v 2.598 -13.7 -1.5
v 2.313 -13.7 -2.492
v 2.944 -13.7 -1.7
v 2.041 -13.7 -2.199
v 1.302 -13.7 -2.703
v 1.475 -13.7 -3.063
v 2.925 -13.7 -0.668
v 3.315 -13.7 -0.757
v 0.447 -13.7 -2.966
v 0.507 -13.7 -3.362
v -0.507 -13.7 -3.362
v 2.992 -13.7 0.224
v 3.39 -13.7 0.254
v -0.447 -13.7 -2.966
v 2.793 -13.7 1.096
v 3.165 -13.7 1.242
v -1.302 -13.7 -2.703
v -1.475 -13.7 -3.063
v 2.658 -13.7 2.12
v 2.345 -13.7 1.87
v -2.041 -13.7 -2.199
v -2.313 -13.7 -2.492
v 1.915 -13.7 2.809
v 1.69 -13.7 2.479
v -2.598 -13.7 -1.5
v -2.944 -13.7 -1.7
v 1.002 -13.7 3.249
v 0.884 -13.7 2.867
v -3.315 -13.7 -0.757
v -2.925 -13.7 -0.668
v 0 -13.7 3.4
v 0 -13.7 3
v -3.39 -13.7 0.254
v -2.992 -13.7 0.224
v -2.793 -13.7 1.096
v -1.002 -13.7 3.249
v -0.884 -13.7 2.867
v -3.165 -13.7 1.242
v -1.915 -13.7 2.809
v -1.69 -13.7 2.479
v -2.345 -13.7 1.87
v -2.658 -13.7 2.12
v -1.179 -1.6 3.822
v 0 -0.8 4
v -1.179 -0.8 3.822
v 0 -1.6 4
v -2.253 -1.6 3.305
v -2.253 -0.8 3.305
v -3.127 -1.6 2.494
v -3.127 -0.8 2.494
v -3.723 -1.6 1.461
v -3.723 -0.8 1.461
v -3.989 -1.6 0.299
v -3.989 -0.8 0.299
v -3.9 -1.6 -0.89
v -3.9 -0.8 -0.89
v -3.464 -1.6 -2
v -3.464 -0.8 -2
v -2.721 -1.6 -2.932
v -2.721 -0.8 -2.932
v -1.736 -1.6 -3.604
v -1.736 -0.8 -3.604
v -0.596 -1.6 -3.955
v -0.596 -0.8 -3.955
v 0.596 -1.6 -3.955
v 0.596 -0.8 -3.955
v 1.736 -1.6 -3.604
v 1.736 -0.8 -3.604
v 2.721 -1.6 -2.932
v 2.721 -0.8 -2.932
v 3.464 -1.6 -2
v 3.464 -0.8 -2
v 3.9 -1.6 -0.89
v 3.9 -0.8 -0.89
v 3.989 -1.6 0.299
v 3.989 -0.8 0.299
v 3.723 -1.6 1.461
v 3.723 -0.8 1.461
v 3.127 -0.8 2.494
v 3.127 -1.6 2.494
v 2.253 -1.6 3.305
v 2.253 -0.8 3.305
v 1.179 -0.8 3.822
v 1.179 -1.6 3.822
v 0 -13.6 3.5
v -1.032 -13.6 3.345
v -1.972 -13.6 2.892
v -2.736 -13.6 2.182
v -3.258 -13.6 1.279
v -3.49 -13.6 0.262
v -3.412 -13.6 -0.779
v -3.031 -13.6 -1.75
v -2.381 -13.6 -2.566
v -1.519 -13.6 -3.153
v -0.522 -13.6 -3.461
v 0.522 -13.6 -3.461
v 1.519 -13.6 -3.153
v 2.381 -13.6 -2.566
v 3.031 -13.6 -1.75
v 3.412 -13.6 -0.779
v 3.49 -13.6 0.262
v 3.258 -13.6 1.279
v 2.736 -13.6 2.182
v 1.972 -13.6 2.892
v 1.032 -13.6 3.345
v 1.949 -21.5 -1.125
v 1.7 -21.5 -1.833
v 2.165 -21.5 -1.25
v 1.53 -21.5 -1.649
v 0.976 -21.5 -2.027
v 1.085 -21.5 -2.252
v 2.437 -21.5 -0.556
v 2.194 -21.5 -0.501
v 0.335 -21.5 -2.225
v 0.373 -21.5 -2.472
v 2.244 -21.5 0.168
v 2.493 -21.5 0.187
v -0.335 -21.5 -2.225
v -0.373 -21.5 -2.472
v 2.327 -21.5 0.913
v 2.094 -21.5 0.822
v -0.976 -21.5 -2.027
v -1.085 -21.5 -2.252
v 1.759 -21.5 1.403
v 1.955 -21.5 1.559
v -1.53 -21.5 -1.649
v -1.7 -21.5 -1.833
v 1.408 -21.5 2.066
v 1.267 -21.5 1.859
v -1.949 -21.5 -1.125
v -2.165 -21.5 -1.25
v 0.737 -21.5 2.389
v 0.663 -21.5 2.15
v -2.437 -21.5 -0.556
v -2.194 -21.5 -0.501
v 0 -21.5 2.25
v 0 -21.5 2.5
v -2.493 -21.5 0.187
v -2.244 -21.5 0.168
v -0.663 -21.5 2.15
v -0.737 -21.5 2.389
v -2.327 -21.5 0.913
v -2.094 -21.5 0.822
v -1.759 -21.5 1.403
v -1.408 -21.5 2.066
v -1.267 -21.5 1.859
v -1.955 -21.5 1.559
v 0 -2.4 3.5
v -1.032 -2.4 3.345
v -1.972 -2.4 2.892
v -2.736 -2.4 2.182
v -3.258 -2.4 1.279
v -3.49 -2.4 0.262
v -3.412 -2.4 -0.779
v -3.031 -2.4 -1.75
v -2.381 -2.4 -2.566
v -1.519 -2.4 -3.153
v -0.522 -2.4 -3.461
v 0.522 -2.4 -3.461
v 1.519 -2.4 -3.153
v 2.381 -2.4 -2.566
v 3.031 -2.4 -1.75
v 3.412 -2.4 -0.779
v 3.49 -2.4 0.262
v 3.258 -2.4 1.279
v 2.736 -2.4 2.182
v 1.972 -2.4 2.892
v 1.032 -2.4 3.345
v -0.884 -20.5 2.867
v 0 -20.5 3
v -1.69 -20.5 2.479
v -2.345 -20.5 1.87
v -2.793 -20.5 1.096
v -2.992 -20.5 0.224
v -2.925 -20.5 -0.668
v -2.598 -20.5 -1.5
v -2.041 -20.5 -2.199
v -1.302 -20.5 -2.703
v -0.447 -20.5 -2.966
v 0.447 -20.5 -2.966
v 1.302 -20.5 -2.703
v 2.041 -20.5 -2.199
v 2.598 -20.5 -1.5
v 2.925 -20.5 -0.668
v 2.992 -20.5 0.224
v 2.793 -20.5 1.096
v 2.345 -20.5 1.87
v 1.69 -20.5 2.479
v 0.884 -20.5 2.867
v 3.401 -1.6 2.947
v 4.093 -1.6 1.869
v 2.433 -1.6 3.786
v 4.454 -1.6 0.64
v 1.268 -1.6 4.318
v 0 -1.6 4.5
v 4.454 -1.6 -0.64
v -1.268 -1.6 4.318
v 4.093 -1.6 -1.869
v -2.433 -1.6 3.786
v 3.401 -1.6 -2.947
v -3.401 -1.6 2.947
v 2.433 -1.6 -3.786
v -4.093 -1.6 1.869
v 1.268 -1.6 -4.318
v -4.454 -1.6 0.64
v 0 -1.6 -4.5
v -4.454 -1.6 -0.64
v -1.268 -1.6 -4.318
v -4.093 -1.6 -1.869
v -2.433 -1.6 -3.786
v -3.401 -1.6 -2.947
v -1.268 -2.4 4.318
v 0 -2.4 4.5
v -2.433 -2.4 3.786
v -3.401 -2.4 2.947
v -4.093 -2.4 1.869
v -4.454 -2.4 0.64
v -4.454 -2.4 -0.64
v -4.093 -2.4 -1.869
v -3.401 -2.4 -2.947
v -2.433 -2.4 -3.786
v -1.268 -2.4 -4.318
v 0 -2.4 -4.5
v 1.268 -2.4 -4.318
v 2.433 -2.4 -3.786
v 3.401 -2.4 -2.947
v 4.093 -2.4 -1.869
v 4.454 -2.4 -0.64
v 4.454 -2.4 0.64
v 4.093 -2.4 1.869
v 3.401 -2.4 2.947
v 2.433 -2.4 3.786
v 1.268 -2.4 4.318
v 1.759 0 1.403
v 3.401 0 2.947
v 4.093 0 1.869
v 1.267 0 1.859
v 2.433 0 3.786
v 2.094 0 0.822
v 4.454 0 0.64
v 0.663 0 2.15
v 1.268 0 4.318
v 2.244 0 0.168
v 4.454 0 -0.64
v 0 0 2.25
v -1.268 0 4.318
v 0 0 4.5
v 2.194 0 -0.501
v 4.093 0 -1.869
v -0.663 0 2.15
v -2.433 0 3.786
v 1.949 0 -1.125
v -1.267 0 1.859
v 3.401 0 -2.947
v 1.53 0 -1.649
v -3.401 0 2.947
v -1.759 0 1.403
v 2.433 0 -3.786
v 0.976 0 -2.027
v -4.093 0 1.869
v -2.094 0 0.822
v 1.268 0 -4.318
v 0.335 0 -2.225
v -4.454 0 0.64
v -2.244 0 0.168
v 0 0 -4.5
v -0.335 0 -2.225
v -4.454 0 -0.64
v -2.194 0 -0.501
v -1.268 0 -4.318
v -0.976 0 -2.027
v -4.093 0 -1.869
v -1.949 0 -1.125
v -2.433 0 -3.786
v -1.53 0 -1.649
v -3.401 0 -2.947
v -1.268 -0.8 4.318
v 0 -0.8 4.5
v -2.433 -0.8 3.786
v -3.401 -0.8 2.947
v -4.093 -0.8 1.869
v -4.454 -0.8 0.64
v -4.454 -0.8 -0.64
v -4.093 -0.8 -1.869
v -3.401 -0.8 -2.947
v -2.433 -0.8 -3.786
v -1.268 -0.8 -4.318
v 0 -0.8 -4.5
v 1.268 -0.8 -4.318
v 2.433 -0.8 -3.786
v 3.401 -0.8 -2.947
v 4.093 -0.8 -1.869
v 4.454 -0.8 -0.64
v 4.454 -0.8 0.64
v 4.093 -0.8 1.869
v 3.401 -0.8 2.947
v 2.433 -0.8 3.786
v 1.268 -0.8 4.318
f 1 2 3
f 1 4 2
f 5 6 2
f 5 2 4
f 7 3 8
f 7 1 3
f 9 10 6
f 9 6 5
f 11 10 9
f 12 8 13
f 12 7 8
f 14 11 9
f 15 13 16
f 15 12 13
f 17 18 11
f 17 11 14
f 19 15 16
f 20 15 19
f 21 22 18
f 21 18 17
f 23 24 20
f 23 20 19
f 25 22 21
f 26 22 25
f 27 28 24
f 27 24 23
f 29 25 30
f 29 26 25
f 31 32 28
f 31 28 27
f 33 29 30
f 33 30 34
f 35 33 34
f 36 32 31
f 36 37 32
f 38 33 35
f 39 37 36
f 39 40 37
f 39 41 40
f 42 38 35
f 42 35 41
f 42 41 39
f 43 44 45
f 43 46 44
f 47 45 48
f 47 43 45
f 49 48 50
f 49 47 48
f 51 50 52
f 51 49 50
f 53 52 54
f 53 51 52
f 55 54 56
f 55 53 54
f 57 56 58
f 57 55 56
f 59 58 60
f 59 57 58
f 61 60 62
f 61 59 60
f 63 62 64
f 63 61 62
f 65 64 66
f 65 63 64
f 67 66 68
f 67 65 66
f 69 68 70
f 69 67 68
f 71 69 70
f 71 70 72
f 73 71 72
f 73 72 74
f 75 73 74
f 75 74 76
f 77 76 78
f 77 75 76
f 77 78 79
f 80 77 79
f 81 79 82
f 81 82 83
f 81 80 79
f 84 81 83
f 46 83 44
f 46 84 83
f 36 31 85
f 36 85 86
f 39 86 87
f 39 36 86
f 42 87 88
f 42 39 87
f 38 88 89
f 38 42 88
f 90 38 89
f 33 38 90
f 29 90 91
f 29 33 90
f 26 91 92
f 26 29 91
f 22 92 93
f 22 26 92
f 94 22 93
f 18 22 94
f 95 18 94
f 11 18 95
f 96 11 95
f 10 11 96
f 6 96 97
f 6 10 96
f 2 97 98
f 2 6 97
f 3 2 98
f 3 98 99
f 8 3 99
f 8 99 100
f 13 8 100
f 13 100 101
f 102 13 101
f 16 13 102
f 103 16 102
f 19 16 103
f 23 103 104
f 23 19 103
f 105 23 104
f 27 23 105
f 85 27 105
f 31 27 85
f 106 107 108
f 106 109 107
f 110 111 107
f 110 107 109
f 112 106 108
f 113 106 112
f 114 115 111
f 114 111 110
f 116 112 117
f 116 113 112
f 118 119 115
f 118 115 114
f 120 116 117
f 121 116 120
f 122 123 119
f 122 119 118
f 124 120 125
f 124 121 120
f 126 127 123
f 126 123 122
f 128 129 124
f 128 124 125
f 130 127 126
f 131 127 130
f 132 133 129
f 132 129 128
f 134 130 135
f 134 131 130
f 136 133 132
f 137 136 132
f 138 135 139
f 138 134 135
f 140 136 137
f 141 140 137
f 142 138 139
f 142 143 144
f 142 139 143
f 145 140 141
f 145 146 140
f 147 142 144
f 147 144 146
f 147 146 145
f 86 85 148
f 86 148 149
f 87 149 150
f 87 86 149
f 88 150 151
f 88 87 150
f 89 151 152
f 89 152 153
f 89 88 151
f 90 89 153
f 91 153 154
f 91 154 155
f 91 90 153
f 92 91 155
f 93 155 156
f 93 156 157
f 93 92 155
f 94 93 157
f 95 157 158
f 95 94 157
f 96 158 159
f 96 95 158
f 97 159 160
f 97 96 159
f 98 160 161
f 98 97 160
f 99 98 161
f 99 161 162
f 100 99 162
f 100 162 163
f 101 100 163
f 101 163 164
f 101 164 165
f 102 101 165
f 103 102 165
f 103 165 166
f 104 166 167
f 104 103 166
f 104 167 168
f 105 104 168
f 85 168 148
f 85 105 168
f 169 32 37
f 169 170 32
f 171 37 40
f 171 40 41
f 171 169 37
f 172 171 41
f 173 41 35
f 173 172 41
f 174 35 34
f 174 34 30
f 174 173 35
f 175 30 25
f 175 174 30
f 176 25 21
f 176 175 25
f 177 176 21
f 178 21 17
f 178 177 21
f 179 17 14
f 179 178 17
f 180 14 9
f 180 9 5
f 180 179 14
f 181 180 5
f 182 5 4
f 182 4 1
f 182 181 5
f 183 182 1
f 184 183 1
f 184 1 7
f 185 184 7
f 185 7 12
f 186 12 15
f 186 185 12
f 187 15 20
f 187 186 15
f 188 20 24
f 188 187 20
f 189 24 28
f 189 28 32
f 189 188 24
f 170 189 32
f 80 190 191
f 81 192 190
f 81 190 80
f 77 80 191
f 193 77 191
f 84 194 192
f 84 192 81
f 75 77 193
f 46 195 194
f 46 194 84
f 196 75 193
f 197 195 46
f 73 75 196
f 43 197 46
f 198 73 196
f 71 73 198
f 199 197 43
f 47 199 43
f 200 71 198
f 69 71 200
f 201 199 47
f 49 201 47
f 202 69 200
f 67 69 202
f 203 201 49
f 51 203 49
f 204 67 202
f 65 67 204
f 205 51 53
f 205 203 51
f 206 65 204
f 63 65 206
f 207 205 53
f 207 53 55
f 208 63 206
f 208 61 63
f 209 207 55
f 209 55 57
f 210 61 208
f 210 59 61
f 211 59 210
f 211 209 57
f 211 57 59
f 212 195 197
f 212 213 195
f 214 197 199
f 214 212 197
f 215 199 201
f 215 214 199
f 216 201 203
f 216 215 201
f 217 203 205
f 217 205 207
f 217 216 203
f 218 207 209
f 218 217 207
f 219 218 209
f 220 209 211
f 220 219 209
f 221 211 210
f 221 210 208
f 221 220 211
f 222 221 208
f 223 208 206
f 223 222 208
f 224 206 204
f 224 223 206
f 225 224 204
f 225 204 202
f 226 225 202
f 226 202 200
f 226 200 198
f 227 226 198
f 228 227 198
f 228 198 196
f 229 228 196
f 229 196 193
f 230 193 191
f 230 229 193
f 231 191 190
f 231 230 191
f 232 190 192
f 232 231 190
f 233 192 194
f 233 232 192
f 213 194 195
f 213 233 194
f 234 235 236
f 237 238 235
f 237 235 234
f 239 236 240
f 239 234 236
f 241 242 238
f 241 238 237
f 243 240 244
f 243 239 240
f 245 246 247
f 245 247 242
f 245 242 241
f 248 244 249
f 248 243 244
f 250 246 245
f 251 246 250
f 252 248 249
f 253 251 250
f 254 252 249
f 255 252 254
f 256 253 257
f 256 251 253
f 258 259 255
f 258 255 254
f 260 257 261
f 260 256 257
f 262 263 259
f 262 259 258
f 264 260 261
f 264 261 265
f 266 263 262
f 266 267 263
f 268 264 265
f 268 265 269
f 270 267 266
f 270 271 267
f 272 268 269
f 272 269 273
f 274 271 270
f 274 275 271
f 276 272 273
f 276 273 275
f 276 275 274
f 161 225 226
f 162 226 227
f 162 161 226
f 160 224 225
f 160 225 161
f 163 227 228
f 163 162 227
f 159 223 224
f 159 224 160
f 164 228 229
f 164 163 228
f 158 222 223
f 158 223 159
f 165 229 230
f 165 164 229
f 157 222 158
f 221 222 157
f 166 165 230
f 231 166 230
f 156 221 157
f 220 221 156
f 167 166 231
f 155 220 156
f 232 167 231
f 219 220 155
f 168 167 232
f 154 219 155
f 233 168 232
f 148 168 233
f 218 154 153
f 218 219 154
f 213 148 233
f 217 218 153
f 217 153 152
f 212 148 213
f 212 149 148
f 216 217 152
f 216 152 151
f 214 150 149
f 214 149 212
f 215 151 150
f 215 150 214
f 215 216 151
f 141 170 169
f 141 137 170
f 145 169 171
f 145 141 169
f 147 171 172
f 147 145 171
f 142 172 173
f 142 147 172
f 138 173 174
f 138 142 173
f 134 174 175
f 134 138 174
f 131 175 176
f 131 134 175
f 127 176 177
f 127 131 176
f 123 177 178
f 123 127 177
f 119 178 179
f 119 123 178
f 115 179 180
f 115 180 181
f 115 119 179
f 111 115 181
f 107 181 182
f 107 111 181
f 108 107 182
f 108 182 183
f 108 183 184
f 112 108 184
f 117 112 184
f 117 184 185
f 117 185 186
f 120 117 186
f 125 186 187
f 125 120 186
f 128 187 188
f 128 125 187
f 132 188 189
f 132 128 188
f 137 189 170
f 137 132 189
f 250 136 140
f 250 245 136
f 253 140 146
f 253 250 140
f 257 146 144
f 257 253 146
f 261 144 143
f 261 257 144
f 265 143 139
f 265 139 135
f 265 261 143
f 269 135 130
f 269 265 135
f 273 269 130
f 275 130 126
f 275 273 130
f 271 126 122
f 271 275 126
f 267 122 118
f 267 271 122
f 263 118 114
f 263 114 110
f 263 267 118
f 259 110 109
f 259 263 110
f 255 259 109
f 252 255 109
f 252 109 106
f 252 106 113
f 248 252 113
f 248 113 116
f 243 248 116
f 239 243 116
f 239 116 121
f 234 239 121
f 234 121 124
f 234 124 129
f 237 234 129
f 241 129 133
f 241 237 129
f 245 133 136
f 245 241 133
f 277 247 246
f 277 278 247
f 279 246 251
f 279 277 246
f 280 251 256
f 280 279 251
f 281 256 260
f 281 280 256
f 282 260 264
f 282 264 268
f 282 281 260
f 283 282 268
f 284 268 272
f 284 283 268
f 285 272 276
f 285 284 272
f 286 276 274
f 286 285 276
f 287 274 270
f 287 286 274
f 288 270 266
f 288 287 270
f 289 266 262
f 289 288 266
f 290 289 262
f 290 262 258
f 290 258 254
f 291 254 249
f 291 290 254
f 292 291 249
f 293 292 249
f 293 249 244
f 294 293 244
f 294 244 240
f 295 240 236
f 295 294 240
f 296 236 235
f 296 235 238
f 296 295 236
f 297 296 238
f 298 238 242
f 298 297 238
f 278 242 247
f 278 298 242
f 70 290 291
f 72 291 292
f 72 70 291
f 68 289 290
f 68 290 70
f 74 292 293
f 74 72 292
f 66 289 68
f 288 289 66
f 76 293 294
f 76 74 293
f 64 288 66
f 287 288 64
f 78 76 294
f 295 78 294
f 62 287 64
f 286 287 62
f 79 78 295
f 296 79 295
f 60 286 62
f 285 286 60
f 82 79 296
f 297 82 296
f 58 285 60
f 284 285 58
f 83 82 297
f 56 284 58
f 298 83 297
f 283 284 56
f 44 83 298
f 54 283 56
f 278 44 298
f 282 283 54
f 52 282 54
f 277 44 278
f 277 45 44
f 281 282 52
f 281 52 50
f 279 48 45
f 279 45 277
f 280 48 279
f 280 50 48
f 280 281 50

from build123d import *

# Parameters (mm, degrees)
F2_SIZE = 0.1


with BuildPart() as f1:
    # F0 (on Right) → F1 (revolve)
    with BuildSketch(Plane.YZ):
        Polygon((-21.5, 2.25), (0, 2.25), (0, 4.5), (-0.8, 4.5), (-0.8, 4), (-1.6, 4), (-1.6, 4.5), (-2.4, 4.5), (-2.4, 3.5), (-13.7, 3.5), (-13.7, 3), (-20.5, 3), (-21.5, 2.5), align=None)
    revolve(axis=Axis((0, -10.75, 0), (0, -1, 0)))

    # F2
    f2_edges = [f1.edges().sort_by_distance(p)[0] for p in [
        (0, -13.7, -3.5),
    ]]
    chamfer(f2_edges, length=F2_SIZE)


solid = f1.part
